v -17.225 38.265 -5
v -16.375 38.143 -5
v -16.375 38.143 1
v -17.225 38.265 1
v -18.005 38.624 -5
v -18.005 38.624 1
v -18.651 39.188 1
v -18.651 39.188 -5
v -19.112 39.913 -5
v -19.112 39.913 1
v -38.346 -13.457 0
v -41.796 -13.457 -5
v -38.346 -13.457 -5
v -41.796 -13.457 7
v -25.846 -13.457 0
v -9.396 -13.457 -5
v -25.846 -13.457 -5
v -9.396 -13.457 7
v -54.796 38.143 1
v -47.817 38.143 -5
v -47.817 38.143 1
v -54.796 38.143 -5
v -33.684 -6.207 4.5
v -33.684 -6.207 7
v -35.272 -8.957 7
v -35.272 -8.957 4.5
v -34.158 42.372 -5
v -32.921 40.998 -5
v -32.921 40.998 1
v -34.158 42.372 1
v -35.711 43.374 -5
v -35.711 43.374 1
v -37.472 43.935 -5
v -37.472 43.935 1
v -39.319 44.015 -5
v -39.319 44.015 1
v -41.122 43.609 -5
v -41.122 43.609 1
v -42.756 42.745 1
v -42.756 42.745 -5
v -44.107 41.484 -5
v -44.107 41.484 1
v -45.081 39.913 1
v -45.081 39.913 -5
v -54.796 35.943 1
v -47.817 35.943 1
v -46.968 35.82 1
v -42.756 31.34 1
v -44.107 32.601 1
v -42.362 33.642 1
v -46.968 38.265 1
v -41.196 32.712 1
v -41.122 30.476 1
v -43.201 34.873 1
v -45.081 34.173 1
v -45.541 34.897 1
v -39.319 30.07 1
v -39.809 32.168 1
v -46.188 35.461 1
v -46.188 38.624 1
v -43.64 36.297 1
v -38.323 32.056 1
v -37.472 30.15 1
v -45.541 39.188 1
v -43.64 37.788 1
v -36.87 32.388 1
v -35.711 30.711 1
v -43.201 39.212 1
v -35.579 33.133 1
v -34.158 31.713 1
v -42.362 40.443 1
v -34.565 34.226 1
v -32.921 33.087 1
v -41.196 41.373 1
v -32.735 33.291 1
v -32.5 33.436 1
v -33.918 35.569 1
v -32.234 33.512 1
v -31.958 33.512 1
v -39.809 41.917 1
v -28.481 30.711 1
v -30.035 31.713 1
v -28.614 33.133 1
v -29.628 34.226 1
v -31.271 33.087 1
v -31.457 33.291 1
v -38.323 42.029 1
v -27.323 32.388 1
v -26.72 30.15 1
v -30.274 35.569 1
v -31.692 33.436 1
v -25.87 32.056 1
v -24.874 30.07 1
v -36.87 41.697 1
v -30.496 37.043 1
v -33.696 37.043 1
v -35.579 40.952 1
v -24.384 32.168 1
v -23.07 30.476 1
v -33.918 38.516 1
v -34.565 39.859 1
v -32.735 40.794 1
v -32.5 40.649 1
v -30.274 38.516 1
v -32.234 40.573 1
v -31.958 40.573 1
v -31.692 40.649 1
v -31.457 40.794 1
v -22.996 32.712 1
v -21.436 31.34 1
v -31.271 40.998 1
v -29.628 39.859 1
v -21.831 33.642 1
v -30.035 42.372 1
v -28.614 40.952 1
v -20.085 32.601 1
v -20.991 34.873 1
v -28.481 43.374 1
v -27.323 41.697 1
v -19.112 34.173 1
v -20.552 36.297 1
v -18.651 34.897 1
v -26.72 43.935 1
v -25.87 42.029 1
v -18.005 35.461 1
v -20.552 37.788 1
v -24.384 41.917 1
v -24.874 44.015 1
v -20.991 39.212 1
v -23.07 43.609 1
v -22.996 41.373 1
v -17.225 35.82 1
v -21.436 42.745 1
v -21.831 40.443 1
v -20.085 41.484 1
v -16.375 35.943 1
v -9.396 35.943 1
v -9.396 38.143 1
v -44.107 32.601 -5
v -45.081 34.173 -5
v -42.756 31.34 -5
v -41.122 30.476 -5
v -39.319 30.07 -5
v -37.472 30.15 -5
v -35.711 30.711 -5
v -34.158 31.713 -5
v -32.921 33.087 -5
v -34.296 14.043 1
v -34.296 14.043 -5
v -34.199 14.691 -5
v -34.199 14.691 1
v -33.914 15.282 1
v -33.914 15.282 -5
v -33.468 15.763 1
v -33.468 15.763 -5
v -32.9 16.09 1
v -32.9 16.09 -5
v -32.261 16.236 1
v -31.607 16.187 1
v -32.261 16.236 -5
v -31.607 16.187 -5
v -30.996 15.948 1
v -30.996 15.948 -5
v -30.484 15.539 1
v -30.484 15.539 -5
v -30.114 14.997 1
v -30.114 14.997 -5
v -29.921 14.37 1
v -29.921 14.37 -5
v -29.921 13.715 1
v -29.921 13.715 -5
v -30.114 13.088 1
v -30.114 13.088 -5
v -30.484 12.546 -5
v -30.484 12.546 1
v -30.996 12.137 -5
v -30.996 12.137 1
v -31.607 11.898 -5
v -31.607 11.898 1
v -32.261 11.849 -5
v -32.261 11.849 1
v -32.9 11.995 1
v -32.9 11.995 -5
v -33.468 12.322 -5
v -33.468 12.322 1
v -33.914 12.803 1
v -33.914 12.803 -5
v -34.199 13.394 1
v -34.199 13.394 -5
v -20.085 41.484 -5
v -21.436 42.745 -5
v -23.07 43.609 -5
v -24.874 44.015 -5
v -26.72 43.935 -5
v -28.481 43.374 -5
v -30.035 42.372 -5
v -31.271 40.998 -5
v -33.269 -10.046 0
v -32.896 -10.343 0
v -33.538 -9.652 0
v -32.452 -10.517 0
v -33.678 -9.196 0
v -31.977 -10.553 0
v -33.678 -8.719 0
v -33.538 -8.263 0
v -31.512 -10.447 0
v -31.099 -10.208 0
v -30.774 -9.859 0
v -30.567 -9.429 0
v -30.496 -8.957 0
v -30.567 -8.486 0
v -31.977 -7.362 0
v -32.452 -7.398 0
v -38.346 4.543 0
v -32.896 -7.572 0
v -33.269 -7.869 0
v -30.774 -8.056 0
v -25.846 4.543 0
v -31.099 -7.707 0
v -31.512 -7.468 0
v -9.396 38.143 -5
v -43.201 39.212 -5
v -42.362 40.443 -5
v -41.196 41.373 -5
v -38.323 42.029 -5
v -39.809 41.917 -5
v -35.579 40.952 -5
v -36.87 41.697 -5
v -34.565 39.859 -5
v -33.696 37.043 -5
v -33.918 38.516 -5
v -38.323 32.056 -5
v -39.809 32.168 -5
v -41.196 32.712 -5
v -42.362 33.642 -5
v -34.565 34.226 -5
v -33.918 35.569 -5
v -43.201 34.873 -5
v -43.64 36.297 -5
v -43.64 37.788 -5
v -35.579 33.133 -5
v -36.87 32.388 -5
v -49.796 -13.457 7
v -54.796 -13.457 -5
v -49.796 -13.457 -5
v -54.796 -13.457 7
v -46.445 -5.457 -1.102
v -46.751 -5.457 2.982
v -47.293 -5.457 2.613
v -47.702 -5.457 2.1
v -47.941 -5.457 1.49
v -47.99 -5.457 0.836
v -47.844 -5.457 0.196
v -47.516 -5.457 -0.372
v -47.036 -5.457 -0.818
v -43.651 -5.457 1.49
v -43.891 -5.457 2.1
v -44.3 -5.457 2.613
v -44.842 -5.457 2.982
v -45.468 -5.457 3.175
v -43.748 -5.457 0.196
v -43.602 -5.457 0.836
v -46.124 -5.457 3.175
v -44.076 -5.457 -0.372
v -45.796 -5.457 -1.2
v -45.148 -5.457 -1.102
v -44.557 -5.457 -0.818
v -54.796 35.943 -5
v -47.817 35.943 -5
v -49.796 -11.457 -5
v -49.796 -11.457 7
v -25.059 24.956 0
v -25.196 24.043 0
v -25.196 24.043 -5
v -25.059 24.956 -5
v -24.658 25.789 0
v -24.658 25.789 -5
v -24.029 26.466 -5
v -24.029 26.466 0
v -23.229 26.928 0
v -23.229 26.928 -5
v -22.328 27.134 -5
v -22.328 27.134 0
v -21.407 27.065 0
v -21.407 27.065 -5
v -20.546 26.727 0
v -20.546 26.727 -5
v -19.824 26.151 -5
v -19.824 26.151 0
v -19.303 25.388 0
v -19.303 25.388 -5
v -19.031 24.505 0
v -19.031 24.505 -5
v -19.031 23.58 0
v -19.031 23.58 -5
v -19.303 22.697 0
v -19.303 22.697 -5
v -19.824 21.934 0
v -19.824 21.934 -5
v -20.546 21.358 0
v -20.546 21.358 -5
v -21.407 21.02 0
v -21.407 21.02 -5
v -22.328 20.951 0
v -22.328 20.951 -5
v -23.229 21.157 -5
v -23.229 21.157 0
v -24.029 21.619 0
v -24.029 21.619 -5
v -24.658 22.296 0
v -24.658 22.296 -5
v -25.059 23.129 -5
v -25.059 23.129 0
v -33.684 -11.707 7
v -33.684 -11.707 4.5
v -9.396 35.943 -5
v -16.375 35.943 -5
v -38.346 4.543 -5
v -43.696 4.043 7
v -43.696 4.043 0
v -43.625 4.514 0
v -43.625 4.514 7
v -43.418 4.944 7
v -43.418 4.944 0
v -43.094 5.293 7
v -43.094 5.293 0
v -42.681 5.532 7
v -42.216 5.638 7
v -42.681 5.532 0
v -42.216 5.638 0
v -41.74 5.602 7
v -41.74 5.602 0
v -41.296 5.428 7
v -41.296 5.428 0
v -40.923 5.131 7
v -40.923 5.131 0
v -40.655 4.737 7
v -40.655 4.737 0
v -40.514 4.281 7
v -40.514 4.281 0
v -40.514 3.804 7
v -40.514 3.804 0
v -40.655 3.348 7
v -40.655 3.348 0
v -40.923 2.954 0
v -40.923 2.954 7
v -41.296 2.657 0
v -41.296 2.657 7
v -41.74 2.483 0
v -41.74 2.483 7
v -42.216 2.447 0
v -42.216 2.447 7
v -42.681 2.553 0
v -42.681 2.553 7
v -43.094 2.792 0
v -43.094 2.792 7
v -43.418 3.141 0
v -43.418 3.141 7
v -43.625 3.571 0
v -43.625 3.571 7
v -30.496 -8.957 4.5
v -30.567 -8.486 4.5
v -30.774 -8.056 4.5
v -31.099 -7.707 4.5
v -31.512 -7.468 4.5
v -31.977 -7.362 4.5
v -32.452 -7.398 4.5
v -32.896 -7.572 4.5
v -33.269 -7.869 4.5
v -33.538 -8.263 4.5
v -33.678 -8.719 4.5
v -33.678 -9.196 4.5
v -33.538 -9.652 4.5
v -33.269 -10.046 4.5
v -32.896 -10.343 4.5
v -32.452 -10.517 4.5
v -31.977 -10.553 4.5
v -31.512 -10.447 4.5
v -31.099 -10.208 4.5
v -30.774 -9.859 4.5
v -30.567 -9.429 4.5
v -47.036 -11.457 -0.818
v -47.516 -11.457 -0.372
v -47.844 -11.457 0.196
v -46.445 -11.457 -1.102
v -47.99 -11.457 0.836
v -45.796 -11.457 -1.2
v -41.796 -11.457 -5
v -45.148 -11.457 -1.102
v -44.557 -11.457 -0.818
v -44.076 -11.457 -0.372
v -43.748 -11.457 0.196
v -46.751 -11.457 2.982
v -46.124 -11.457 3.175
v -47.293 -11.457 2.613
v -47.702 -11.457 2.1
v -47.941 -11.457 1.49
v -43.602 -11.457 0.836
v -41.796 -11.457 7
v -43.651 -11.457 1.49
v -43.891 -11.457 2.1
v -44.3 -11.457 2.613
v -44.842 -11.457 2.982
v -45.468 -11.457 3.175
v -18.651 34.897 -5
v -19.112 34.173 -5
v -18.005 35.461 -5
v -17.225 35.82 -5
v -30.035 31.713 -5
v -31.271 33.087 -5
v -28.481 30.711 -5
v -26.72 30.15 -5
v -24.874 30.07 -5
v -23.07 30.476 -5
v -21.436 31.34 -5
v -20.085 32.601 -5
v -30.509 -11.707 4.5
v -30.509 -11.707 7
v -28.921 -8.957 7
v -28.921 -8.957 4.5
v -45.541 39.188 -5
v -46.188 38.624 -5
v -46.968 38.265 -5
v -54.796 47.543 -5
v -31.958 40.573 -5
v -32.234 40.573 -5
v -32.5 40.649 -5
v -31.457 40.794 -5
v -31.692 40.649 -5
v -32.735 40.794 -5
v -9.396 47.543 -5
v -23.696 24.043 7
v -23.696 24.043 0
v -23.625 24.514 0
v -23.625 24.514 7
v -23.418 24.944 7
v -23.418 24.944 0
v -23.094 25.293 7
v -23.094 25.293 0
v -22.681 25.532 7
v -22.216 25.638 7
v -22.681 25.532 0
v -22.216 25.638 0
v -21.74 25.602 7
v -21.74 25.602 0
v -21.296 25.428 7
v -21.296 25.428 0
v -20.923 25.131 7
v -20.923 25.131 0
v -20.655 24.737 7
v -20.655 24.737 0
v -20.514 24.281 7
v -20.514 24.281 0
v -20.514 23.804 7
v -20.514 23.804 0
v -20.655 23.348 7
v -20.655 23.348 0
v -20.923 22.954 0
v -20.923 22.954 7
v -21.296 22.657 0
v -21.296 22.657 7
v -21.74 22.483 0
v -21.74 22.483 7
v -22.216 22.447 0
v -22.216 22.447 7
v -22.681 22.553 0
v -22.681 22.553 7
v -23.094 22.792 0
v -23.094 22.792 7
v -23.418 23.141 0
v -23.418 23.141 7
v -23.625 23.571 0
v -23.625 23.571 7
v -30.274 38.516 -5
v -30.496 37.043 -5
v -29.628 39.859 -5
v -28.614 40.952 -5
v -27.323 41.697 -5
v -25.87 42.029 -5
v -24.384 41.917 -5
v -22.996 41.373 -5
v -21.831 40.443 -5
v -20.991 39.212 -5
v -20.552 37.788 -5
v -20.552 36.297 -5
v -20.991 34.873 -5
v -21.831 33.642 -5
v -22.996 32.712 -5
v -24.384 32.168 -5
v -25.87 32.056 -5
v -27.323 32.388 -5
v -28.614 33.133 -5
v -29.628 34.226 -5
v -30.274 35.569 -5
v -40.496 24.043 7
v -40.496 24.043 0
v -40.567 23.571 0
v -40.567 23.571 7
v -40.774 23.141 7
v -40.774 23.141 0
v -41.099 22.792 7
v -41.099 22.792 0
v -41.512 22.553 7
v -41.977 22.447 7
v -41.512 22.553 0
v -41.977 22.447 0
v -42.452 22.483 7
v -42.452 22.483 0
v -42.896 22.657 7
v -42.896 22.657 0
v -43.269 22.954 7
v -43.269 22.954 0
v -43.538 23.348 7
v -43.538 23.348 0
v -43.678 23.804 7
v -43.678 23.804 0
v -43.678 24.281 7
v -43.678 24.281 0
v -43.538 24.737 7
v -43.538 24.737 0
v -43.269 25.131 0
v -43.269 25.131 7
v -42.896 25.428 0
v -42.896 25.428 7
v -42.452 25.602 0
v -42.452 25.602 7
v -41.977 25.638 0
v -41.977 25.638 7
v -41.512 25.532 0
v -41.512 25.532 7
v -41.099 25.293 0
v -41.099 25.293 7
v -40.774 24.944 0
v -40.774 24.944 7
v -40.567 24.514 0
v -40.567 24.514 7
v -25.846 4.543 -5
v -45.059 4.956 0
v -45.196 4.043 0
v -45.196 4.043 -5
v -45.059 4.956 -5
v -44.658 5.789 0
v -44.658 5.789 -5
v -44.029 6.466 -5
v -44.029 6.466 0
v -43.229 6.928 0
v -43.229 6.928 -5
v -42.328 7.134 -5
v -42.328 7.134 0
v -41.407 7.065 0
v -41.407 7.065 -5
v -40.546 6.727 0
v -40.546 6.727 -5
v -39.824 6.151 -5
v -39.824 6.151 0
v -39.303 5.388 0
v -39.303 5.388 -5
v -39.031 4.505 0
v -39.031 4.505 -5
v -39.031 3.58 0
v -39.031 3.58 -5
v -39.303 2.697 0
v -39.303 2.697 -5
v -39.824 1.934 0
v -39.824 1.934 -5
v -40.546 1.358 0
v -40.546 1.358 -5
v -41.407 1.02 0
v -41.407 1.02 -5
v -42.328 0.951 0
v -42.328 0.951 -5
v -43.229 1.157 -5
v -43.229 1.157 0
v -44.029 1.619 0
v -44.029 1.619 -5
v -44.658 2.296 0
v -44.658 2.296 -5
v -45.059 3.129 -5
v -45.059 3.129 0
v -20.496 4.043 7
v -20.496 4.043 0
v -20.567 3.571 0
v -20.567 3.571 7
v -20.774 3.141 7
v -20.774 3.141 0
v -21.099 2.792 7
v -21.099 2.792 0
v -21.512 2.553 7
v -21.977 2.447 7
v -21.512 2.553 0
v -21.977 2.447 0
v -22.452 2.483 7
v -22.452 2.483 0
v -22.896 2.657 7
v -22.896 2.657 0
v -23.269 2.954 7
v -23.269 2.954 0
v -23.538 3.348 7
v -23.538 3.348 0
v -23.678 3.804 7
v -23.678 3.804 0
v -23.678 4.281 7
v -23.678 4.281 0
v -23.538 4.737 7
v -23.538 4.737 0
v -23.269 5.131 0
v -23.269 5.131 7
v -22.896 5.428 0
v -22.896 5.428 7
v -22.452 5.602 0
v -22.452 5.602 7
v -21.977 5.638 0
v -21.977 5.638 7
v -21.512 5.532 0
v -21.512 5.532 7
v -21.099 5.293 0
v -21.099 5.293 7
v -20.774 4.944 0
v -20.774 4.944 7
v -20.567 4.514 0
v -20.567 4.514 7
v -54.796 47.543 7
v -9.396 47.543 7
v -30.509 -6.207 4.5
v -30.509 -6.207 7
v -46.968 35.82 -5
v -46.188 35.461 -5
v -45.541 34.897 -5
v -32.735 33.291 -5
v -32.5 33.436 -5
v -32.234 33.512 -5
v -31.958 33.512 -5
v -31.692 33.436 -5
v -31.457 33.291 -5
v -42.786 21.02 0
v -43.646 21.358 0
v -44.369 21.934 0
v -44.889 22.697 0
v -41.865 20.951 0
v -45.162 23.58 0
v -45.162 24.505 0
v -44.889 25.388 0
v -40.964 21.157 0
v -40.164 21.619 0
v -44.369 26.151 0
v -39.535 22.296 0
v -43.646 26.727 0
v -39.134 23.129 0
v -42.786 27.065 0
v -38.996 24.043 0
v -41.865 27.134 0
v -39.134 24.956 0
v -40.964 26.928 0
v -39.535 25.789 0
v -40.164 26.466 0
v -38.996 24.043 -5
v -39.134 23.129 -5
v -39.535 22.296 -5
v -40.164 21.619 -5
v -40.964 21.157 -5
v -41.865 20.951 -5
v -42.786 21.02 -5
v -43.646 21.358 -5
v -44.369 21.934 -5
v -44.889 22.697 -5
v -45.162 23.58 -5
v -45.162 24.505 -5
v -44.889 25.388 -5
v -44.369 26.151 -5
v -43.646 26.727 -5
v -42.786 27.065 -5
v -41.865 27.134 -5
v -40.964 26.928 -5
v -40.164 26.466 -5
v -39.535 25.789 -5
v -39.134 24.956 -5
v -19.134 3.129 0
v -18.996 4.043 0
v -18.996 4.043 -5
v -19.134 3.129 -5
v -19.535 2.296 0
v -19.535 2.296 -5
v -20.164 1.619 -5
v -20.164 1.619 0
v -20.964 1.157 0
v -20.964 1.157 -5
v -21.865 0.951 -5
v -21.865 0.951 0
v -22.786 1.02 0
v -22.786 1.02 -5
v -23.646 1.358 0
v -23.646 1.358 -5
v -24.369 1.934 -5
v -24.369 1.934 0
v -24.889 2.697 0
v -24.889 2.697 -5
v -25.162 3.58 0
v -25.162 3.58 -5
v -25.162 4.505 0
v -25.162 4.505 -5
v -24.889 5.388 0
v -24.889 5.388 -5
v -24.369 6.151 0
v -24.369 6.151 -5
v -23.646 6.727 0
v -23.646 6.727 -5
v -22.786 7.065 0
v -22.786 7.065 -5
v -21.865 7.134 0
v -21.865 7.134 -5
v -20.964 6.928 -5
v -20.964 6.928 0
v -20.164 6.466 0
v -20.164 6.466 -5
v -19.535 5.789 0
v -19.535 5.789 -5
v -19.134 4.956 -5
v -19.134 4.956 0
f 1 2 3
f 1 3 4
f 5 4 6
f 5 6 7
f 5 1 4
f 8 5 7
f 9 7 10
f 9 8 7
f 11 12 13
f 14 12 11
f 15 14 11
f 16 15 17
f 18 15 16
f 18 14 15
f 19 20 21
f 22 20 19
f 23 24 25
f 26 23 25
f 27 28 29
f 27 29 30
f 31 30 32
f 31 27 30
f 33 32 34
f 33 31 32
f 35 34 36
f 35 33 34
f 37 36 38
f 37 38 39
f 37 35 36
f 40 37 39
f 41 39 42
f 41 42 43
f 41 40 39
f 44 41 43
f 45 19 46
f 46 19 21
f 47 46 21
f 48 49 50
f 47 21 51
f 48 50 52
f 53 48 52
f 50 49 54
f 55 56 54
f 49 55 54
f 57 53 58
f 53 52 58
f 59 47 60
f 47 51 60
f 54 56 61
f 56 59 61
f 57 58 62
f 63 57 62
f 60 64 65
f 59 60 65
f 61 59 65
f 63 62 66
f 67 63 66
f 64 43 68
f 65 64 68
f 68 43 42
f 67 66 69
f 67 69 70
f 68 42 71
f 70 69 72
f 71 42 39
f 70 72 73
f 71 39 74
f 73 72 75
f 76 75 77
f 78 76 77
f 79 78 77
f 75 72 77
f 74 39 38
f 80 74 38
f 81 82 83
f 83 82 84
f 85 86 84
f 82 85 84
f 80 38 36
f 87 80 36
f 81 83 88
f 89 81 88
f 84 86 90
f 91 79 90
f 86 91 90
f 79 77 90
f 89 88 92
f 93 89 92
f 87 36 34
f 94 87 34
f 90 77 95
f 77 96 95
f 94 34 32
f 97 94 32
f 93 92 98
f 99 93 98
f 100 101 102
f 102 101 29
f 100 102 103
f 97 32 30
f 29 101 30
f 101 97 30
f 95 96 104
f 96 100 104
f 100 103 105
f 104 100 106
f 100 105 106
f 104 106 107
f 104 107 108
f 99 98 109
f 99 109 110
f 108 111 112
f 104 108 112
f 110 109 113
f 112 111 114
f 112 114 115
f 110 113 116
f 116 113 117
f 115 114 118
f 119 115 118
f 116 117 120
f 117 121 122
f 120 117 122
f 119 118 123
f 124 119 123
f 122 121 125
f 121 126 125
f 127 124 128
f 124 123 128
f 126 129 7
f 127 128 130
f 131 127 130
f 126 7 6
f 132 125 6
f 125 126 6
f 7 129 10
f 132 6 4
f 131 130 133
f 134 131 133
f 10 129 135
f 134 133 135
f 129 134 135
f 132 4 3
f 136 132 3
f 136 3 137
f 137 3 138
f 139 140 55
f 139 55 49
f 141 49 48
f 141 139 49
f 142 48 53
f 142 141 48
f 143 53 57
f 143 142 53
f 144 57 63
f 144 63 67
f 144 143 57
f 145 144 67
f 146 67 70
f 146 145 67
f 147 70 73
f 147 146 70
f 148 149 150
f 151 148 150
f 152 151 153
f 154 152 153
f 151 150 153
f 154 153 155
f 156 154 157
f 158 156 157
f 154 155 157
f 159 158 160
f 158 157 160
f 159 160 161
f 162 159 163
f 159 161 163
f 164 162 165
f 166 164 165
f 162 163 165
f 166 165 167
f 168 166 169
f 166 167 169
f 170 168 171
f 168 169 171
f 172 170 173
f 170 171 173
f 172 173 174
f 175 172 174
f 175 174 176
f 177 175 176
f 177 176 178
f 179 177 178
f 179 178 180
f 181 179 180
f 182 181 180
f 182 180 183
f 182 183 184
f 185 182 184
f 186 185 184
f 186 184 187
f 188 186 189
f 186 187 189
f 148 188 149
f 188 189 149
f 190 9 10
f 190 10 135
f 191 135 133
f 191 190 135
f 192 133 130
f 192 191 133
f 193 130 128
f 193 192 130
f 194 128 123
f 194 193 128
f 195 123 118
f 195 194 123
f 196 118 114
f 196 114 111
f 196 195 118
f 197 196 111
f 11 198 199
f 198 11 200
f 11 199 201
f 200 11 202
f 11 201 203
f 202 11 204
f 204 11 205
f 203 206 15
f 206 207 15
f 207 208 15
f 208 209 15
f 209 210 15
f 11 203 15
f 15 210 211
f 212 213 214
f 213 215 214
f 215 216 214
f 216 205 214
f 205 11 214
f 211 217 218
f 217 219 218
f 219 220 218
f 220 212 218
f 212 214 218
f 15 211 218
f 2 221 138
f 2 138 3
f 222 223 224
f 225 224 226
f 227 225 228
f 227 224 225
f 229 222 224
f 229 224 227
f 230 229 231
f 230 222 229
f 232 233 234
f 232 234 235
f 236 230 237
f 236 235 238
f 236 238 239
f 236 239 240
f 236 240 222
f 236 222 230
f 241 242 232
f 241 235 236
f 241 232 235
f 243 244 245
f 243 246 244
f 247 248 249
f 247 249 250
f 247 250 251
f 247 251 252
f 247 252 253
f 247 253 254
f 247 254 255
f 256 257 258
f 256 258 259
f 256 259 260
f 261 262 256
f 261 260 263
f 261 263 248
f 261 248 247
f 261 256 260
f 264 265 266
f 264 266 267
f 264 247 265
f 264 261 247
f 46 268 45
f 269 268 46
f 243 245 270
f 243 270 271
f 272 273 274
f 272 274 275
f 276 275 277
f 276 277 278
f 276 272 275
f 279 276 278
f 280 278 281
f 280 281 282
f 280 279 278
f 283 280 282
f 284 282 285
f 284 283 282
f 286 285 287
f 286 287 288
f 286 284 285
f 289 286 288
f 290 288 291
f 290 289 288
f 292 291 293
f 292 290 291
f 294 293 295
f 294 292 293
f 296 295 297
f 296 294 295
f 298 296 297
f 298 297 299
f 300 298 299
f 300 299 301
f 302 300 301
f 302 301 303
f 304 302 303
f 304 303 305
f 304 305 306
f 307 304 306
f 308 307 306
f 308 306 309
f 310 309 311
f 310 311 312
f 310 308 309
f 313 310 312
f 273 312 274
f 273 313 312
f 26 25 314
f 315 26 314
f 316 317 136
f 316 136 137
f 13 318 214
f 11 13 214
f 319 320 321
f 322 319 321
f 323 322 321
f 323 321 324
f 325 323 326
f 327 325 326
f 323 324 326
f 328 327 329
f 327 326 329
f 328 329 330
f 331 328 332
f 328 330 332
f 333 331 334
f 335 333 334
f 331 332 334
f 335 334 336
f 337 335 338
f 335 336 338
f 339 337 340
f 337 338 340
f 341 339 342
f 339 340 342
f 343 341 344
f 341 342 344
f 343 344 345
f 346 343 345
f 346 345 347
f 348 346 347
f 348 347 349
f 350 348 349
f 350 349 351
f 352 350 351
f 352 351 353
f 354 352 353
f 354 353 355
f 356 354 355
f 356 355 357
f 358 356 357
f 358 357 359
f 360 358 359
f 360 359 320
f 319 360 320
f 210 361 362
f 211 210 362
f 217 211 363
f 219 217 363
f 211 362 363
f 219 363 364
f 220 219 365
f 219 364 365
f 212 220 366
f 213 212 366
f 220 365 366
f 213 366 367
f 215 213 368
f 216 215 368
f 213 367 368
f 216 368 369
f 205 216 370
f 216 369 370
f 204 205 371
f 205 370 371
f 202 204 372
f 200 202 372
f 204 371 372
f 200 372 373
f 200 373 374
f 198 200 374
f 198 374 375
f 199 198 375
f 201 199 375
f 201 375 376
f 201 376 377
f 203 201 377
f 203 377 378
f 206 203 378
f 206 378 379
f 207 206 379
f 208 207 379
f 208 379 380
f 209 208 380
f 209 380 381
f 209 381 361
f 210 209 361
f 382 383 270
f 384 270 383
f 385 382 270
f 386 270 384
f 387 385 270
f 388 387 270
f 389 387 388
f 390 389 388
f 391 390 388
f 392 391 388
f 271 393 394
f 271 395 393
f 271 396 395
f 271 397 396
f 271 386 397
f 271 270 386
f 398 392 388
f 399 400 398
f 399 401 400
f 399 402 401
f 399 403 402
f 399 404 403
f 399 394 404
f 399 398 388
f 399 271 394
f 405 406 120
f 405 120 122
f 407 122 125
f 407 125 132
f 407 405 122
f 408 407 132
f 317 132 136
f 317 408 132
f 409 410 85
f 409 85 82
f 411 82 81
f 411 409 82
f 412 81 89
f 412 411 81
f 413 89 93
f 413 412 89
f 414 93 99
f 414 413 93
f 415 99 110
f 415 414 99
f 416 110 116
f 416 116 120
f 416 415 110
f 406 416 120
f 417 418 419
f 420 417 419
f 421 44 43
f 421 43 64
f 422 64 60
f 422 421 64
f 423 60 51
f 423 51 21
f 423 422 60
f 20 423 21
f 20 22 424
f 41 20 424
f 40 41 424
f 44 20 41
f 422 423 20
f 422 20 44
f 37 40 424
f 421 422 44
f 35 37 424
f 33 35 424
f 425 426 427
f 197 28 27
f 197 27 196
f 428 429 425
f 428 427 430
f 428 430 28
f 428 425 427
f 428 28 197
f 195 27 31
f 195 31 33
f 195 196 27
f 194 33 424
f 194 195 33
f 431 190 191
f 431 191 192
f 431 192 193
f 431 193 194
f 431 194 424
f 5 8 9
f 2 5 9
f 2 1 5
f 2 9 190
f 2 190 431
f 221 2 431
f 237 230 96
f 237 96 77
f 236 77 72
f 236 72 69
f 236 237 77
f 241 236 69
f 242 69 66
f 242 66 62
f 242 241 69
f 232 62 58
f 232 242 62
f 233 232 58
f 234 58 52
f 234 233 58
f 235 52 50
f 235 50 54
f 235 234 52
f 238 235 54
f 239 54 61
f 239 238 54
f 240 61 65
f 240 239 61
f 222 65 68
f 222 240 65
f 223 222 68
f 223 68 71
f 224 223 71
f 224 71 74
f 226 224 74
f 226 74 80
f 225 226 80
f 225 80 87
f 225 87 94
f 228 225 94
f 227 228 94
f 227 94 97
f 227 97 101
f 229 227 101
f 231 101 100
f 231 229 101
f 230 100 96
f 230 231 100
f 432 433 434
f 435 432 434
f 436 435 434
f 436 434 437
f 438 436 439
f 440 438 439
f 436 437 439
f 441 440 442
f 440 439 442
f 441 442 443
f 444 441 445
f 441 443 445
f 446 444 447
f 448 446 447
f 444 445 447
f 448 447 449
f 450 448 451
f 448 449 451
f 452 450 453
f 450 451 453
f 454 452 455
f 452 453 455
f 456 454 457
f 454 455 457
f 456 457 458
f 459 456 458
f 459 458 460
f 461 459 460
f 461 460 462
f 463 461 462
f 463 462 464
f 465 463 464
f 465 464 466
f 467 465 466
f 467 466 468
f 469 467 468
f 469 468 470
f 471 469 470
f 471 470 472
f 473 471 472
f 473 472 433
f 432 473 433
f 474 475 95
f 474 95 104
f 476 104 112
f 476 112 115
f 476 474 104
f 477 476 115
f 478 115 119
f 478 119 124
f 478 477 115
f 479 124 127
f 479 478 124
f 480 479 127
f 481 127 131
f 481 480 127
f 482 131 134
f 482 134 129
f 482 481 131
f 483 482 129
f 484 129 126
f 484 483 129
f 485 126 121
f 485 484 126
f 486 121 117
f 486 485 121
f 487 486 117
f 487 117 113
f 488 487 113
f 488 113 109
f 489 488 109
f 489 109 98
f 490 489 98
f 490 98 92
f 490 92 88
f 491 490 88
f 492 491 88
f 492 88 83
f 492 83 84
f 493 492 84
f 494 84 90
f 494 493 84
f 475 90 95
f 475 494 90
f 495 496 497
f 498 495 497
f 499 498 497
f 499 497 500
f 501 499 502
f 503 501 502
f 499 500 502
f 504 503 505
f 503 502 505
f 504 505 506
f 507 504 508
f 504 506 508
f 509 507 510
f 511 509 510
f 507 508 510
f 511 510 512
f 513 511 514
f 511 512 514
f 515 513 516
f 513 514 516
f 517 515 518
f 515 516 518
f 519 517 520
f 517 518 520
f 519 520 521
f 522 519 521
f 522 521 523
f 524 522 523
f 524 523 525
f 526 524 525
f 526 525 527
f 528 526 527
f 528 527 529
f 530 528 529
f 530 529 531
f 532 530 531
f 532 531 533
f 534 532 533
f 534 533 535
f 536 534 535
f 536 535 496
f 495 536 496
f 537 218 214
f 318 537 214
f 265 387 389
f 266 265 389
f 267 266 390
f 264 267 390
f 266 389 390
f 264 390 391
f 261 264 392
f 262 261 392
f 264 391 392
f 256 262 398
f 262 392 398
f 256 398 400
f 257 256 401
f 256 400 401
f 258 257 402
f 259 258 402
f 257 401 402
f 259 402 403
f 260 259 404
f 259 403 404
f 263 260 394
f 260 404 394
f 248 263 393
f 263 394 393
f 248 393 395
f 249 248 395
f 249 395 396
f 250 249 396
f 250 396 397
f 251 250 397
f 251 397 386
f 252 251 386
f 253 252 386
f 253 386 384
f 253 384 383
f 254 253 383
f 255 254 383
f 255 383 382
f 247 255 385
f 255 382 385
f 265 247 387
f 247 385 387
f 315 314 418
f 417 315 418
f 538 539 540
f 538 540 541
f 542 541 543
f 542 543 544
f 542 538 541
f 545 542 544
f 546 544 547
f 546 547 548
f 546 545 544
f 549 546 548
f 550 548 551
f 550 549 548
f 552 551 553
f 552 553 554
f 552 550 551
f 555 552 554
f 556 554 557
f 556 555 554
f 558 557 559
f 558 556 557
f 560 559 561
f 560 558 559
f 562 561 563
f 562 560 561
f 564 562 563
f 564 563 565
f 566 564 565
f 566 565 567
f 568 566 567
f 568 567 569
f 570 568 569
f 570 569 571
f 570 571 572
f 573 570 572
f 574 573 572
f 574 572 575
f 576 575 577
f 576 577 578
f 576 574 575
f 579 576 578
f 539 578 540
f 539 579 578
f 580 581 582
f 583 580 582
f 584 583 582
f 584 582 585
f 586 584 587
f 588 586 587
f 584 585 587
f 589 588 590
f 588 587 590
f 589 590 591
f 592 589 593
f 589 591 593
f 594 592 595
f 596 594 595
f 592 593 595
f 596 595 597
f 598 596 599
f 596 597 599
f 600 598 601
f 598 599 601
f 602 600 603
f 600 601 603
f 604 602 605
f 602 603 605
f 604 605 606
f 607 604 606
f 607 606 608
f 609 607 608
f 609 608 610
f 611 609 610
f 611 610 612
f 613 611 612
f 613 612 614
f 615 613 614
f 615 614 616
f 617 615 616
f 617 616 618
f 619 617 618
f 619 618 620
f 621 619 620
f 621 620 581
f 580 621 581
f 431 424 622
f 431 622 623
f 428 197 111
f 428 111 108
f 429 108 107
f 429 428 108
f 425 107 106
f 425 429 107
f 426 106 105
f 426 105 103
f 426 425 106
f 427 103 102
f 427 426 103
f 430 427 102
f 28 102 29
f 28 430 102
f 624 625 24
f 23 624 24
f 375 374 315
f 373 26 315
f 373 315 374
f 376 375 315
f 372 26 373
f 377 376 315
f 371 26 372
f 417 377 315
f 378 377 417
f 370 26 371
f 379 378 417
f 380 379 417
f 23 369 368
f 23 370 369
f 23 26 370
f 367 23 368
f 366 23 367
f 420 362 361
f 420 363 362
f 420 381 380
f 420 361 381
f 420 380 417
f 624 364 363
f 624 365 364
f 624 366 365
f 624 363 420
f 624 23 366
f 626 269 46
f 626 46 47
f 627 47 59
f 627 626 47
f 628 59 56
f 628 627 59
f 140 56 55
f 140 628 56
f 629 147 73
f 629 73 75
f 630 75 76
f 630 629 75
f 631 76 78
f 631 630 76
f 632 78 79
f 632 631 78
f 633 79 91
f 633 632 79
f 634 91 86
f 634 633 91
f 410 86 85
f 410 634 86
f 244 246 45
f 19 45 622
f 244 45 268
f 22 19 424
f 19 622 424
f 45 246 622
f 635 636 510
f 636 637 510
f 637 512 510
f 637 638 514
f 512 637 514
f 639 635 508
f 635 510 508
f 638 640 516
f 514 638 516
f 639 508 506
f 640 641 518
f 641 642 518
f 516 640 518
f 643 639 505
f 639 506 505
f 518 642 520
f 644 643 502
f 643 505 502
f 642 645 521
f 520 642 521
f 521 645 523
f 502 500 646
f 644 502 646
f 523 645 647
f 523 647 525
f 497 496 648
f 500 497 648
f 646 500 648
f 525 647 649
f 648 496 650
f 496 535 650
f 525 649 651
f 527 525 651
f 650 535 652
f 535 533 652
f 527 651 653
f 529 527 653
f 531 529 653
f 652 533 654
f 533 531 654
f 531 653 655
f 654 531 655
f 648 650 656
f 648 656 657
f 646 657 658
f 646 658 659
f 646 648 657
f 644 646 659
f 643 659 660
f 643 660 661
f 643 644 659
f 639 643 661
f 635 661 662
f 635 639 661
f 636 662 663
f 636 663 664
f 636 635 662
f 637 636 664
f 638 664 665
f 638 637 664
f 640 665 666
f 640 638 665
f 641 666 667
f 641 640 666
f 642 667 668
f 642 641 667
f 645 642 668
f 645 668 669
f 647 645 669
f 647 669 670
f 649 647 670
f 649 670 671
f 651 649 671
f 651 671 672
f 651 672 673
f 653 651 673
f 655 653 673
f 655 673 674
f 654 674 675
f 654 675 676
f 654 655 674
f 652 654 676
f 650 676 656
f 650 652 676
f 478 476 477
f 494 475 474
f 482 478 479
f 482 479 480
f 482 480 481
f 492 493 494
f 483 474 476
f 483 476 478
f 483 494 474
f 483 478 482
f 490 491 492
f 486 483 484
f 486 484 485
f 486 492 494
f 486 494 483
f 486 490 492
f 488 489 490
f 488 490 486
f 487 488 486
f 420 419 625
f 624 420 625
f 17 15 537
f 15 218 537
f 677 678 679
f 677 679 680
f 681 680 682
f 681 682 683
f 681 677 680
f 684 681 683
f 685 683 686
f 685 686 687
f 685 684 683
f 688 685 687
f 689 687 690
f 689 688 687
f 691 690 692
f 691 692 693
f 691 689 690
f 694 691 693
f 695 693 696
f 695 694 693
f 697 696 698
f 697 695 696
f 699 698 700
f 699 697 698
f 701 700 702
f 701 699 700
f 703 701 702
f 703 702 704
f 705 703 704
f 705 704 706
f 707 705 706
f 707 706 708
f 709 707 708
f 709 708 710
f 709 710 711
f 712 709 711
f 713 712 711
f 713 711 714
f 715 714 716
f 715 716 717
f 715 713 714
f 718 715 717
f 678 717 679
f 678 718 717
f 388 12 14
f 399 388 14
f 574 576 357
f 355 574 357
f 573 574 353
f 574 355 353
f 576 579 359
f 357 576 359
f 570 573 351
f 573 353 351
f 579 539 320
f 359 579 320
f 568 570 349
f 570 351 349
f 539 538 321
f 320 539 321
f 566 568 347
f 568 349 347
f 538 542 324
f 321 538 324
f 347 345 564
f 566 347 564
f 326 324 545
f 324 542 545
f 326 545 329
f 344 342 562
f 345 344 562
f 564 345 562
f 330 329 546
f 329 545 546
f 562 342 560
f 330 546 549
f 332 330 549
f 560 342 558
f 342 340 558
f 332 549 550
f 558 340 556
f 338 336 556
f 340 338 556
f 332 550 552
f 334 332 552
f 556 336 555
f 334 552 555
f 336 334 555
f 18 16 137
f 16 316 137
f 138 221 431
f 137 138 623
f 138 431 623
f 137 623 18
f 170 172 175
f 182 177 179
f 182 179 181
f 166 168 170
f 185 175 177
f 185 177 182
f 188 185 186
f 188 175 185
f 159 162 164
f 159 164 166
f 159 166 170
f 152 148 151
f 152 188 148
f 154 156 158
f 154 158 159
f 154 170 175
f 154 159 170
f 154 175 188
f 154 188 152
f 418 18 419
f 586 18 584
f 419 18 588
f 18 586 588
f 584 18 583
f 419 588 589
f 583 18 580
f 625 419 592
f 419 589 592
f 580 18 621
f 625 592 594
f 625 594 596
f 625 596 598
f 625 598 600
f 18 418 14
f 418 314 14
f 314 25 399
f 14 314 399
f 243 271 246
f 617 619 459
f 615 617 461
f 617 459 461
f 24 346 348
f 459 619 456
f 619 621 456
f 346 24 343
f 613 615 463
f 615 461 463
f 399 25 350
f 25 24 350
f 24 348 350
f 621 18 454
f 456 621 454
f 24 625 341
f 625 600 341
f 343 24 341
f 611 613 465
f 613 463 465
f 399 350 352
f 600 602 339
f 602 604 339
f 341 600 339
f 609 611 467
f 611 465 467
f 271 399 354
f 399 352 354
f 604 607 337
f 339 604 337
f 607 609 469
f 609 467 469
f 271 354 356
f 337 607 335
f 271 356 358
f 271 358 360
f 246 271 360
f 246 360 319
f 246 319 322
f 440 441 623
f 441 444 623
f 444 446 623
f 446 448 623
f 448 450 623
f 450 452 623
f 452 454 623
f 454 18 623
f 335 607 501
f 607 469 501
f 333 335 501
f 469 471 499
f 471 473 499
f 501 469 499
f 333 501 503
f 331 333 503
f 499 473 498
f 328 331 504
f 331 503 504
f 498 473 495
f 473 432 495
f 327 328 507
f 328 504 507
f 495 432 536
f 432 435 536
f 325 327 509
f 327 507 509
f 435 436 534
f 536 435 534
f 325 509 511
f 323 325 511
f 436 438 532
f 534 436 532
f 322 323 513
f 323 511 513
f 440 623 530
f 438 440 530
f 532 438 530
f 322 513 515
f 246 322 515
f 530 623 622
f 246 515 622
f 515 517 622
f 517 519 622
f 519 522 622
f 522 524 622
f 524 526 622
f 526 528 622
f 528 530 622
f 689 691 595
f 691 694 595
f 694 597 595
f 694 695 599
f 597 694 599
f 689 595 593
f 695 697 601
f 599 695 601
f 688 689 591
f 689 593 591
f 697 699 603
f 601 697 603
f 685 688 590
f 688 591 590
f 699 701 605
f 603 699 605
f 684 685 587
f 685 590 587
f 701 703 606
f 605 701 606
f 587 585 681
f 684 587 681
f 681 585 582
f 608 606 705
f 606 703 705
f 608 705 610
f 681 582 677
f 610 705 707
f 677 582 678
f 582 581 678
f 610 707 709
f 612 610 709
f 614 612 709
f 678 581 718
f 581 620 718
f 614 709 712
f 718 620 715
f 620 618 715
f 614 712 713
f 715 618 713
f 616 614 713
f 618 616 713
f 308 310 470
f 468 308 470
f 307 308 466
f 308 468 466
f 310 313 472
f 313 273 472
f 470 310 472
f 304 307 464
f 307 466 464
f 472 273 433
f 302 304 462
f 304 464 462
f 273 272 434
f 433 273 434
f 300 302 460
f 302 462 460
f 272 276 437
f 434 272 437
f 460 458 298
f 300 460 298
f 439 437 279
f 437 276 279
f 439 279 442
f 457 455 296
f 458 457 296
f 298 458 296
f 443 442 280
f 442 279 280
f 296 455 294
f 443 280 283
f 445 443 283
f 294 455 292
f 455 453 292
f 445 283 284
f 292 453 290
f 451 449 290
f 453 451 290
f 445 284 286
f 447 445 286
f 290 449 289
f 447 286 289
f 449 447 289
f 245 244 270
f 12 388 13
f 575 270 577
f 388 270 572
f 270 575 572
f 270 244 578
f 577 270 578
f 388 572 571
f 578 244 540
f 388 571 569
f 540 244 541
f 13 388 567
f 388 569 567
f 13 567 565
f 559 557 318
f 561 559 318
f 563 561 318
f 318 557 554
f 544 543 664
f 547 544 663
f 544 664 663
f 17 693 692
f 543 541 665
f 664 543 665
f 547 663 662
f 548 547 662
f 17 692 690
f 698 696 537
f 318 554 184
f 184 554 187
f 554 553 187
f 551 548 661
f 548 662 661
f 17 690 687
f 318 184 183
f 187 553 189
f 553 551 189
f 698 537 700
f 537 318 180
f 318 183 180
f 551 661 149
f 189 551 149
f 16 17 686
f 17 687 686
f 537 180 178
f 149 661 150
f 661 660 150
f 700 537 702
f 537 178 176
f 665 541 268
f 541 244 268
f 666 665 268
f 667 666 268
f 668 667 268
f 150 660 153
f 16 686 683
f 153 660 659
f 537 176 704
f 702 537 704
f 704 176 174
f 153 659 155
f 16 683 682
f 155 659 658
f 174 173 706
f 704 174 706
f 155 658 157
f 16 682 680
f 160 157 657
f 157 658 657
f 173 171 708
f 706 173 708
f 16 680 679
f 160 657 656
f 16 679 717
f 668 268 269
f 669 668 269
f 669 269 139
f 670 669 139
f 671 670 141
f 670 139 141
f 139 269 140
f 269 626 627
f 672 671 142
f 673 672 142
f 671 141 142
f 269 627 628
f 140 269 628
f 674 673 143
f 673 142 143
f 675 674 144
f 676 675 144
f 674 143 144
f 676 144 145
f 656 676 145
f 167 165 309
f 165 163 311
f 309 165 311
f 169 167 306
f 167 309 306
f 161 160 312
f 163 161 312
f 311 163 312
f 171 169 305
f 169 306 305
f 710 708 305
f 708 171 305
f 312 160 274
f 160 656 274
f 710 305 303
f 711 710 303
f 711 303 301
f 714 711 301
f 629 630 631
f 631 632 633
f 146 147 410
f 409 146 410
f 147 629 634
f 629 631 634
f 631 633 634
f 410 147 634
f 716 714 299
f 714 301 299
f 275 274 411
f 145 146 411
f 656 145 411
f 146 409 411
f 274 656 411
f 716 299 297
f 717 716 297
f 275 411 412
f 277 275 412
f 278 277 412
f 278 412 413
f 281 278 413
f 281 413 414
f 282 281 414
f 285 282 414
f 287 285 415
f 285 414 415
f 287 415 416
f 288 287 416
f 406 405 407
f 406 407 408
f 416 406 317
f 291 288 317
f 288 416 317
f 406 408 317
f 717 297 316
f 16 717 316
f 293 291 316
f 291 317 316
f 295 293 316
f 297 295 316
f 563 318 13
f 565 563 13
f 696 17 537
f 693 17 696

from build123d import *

# Parameters (mm, degrees)
SKETCH_1_W          = 45.4
SKETCH_1_H          = 27
EXTRUDE_1_DEPTH     = 7
SKETCH_2_R          = 1.6
CUT_EXTRUDE_1_DEPTH = 62.727033531
SKETCH_4_R          = 3.1
EXTRUDE_2_DEPTH     = 5
SKETCH_5_W          = 45.4
SKETCH_5_H          = 12
EXTRUDE_3_DEPTH     = 20
SKETCH_7_R          = 5
CUT_EXTRUDE_3_DEPTH = 6
EXTRUDE_4_DEPTH     = 14
SKETCH_9_R          = 1.6
CUT_EXTRUDE_4_DEPTH = 74.531810641
CUT_EXTRUDE_5_DEPTH = 2.5
SKETCH_10_W         = 8
SKETCH_10_H         = 12
CUT_EXTRUDE_6_DEPTH = 2
SKETCH_12_R         = 2.2
CUT_EXTRUDE_8_DEPTH = 6
SKETCH_13_R         = 2.2
CUT_EXTRUDE_9_DEPTH = 6


with BuildPart() as part:
    # 草图1 → 凸台-拉伸1 (new body)
    with BuildSketch(Plane.XY):
        with Locations((-32.096319797, 14.04251269)):
            Rectangle(SKETCH_1_W, SKETCH_1_H)
    extrude(amount=EXTRUDE_1_DEPTH)

    # 草图2 → 切除-拉伸1 (cut, through all)
    with BuildSketch(Plane(origin=(0, 0, 0), x_dir=(-1, 0, 0), z_dir=(0, 0, -1))):
        with Locations((22.096319797, 24.04251269)):
            Circle(SKETCH_2_R)
        with Locations(Location((42.096319797, 24.04251269, 0), (0, 0, 180))):
            Circle(SKETCH_2_R)
        with Locations((42.096319797, 4.04251269)):
            Circle(SKETCH_2_R)
        with Locations(Location((22.096319797, 4.04251269, 0), (0, 0, 180))):
            Circle(SKETCH_2_R)
    extrude(amount=-CUT_EXTRUDE_1_DEPTH, mode=Mode.SUBTRACT)

    # 草图4 → 凸台-拉伸2 (add)
    with BuildSketch(Plane(origin=(0, 0, 0), x_dir=(-1, 0, 0), z_dir=(0, 0, -1))):
        Polygon((38.346319797, 0.54251269), (54.796319797, 0.54251269), (54.796319797, 27.54251269), (9.396319797, 27.54251269), (9.396319797, 0.54251269), (25.846319797, 0.54251269), (25.846319797, 4.54251269), (38.346319797, 4.54251269), align=None)
        with Locations(Location((42.096319797, 24.04251269, 0), (0, 0, 180))):
            Circle(SKETCH_4_R, mode=Mode.SUBTRACT)
        with Locations((22.096319797, 24.04251269)):
            Circle(SKETCH_4_R, mode=Mode.SUBTRACT)
        with Locations((42.096319797, 4.04251269)):
            Circle(SKETCH_4_R, mode=Mode.SUBTRACT)
        with Locations(Location((22.096319797, 4.04251269, 0), (0, 0, 180))):
            Circle(SKETCH_4_R, mode=Mode.SUBTRACT)
    extrude(amount=EXTRUDE_2_DEPTH)

    # 草图5 → 凸台-拉伸3 (add)
    with BuildSketch(Plane(origin=(0, 27.54251269, 0), x_dir=(1, 0, 0), z_dir=(0, 1, 0))):
        with Locations((-32.096319797, -1)):
            Rectangle(SKETCH_5_W, SKETCH_5_H)
    extrude(amount=EXTRUDE_3_DEPTH)

    # 草图7 → 切除-拉伸3 (cut)
    with BuildSketch(Plane(origin=(0, 0, -5), x_dir=(-1, 0, 0), z_dir=(0, 0, -1))):
        with BuildLine():
            Line((9.396319797, 38.14251269), (16.375464574, 38.14251269))
            ThreePointArc((16.375464574, 38.14251269), (18.004881648, 38.623584347), (19.111721141, 39.91251269))
            ThreePointArc((19.111721141, 39.91251269), (24.873653651, 44.014763896), (31.271319797, 40.998441785))
            ThreePointArc((31.271319797, 40.998441785), (32.096319797, 40.563574513), (32.921319797, 40.998441785))
            ThreePointArc((32.921319797, 40.998441785), (39.318985943, 44.014763896), (45.080918453, 39.91251269))
            ThreePointArc((45.080918453, 39.91251269), (46.187757946, 38.623584347), (47.81717502, 38.14251269))
            Line((47.81717502, 38.14251269), (54.796319797, 38.14251269))
            Line((54.796319797, 38.14251269), (54.796319797, 35.94251269))
            Line((54.796319797, 35.94251269), (47.81717502, 35.94251269))
            ThreePointArc((47.81717502, 35.94251269), (46.187757946, 35.461441034), (45.080918453, 34.17251269))
            ThreePointArc((45.080918453, 34.17251269), (39.318985943, 30.070261485), (32.921319797, 33.086583596))
            ThreePointArc((32.921319797, 33.086583596), (32.096319797, 33.521450868), (31.271319797, 33.086583596))
            ThreePointArc((31.271319797, 33.086583596), (24.873653651, 30.070261485), (19.111721141, 34.17251269))
            ThreePointArc((19.111721141, 34.17251269), (18.004881648, 35.461441034), (16.375464574, 35.94251269))
            Line((16.375464574, 35.94251269), (9.396319797, 35.94251269))
            Line((9.396319797, 35.94251269), (9.396319797, 38.14251269))
        make_face()
        with Locations((25.496319797, 37.04251269)):
            Circle(SKETCH_7_R, mode=Mode.SUBTRACT)
        with Locations(Location((38.696319797, 37.04251269, 0), (0, 0, 180))):
            Circle(SKETCH_7_R, mode=Mode.SUBTRACT)
    extrude(amount=-CUT_EXTRUDE_3_DEPTH, mode=Mode.SUBTRACT)

    # 草图8 → 凸台-拉伸4 (add)
    with BuildSketch(Plane.XZ.offset(-0.54251269)):
        Polygon((-38.346319797, -5), (-38.346319797, 0), (-25.846319797, 0), (-25.846319797, -5), (-9.396319797, -5), (-9.396319797, 7), (-54.796319797, 7), (-54.796319797, -5), align=None)
    extrude(amount=EXTRUDE_4_DEPTH)

    # 草图9 → 切除-拉伸4 (cut, through all)
    with BuildSketch(Plane.XY.offset(7)):
        with Locations((-32.096319797, -8.95748731)):
            Circle(SKETCH_9_R)
    extrude(amount=-CUT_EXTRUDE_4_DEPTH, mode=Mode.SUBTRACT)

    # 草图3 → 切除-拉伸5 (cut)
    with BuildSketch(Plane.XY.offset(7)):
        Polygon((-28.920893316, -8.95748731), (-30.508606557, -6.20748731), (-33.684033037, -6.20748731), (-35.271746277, -8.95748731), (-33.684033037, -11.70748731), (-30.508606557, -11.70748731), align=None)
    extrude(amount=-CUT_EXTRUDE_5_DEPTH, mode=Mode.SUBTRACT)

    # 草图10 → 切除-拉伸6 (cut)
    with BuildSketch(Plane.XZ.offset(13.45748731)):
        with Locations((-45.796319797, 1)):
            Rectangle(SKETCH_10_W, SKETCH_10_H)
    extrude(amount=-CUT_EXTRUDE_6_DEPTH, mode=Mode.SUBTRACT)

    # 草图12 → 切除-拉伸8 (cut)
    with BuildSketch(Plane.XZ.offset(11.45748731)):
        with Locations(Location((-45.796319797, 1, 0), (0, 0, 270))):
            Circle(SKETCH_12_R)
    extrude(amount=-CUT_EXTRUDE_8_DEPTH, mode=Mode.SUBTRACT)

    # 草图13 → 切除-拉伸9 (cut)
    with BuildSketch(Plane(origin=(0, 0, -5), x_dir=(-1, 0, 0), z_dir=(0, 0, -1))):
        with Locations((32.096319797, 14.04251269)):
            Circle(SKETCH_13_R)
    extrude(amount=-CUT_EXTRUDE_9_DEPTH, mode=Mode.SUBTRACT)


solid = part.part
